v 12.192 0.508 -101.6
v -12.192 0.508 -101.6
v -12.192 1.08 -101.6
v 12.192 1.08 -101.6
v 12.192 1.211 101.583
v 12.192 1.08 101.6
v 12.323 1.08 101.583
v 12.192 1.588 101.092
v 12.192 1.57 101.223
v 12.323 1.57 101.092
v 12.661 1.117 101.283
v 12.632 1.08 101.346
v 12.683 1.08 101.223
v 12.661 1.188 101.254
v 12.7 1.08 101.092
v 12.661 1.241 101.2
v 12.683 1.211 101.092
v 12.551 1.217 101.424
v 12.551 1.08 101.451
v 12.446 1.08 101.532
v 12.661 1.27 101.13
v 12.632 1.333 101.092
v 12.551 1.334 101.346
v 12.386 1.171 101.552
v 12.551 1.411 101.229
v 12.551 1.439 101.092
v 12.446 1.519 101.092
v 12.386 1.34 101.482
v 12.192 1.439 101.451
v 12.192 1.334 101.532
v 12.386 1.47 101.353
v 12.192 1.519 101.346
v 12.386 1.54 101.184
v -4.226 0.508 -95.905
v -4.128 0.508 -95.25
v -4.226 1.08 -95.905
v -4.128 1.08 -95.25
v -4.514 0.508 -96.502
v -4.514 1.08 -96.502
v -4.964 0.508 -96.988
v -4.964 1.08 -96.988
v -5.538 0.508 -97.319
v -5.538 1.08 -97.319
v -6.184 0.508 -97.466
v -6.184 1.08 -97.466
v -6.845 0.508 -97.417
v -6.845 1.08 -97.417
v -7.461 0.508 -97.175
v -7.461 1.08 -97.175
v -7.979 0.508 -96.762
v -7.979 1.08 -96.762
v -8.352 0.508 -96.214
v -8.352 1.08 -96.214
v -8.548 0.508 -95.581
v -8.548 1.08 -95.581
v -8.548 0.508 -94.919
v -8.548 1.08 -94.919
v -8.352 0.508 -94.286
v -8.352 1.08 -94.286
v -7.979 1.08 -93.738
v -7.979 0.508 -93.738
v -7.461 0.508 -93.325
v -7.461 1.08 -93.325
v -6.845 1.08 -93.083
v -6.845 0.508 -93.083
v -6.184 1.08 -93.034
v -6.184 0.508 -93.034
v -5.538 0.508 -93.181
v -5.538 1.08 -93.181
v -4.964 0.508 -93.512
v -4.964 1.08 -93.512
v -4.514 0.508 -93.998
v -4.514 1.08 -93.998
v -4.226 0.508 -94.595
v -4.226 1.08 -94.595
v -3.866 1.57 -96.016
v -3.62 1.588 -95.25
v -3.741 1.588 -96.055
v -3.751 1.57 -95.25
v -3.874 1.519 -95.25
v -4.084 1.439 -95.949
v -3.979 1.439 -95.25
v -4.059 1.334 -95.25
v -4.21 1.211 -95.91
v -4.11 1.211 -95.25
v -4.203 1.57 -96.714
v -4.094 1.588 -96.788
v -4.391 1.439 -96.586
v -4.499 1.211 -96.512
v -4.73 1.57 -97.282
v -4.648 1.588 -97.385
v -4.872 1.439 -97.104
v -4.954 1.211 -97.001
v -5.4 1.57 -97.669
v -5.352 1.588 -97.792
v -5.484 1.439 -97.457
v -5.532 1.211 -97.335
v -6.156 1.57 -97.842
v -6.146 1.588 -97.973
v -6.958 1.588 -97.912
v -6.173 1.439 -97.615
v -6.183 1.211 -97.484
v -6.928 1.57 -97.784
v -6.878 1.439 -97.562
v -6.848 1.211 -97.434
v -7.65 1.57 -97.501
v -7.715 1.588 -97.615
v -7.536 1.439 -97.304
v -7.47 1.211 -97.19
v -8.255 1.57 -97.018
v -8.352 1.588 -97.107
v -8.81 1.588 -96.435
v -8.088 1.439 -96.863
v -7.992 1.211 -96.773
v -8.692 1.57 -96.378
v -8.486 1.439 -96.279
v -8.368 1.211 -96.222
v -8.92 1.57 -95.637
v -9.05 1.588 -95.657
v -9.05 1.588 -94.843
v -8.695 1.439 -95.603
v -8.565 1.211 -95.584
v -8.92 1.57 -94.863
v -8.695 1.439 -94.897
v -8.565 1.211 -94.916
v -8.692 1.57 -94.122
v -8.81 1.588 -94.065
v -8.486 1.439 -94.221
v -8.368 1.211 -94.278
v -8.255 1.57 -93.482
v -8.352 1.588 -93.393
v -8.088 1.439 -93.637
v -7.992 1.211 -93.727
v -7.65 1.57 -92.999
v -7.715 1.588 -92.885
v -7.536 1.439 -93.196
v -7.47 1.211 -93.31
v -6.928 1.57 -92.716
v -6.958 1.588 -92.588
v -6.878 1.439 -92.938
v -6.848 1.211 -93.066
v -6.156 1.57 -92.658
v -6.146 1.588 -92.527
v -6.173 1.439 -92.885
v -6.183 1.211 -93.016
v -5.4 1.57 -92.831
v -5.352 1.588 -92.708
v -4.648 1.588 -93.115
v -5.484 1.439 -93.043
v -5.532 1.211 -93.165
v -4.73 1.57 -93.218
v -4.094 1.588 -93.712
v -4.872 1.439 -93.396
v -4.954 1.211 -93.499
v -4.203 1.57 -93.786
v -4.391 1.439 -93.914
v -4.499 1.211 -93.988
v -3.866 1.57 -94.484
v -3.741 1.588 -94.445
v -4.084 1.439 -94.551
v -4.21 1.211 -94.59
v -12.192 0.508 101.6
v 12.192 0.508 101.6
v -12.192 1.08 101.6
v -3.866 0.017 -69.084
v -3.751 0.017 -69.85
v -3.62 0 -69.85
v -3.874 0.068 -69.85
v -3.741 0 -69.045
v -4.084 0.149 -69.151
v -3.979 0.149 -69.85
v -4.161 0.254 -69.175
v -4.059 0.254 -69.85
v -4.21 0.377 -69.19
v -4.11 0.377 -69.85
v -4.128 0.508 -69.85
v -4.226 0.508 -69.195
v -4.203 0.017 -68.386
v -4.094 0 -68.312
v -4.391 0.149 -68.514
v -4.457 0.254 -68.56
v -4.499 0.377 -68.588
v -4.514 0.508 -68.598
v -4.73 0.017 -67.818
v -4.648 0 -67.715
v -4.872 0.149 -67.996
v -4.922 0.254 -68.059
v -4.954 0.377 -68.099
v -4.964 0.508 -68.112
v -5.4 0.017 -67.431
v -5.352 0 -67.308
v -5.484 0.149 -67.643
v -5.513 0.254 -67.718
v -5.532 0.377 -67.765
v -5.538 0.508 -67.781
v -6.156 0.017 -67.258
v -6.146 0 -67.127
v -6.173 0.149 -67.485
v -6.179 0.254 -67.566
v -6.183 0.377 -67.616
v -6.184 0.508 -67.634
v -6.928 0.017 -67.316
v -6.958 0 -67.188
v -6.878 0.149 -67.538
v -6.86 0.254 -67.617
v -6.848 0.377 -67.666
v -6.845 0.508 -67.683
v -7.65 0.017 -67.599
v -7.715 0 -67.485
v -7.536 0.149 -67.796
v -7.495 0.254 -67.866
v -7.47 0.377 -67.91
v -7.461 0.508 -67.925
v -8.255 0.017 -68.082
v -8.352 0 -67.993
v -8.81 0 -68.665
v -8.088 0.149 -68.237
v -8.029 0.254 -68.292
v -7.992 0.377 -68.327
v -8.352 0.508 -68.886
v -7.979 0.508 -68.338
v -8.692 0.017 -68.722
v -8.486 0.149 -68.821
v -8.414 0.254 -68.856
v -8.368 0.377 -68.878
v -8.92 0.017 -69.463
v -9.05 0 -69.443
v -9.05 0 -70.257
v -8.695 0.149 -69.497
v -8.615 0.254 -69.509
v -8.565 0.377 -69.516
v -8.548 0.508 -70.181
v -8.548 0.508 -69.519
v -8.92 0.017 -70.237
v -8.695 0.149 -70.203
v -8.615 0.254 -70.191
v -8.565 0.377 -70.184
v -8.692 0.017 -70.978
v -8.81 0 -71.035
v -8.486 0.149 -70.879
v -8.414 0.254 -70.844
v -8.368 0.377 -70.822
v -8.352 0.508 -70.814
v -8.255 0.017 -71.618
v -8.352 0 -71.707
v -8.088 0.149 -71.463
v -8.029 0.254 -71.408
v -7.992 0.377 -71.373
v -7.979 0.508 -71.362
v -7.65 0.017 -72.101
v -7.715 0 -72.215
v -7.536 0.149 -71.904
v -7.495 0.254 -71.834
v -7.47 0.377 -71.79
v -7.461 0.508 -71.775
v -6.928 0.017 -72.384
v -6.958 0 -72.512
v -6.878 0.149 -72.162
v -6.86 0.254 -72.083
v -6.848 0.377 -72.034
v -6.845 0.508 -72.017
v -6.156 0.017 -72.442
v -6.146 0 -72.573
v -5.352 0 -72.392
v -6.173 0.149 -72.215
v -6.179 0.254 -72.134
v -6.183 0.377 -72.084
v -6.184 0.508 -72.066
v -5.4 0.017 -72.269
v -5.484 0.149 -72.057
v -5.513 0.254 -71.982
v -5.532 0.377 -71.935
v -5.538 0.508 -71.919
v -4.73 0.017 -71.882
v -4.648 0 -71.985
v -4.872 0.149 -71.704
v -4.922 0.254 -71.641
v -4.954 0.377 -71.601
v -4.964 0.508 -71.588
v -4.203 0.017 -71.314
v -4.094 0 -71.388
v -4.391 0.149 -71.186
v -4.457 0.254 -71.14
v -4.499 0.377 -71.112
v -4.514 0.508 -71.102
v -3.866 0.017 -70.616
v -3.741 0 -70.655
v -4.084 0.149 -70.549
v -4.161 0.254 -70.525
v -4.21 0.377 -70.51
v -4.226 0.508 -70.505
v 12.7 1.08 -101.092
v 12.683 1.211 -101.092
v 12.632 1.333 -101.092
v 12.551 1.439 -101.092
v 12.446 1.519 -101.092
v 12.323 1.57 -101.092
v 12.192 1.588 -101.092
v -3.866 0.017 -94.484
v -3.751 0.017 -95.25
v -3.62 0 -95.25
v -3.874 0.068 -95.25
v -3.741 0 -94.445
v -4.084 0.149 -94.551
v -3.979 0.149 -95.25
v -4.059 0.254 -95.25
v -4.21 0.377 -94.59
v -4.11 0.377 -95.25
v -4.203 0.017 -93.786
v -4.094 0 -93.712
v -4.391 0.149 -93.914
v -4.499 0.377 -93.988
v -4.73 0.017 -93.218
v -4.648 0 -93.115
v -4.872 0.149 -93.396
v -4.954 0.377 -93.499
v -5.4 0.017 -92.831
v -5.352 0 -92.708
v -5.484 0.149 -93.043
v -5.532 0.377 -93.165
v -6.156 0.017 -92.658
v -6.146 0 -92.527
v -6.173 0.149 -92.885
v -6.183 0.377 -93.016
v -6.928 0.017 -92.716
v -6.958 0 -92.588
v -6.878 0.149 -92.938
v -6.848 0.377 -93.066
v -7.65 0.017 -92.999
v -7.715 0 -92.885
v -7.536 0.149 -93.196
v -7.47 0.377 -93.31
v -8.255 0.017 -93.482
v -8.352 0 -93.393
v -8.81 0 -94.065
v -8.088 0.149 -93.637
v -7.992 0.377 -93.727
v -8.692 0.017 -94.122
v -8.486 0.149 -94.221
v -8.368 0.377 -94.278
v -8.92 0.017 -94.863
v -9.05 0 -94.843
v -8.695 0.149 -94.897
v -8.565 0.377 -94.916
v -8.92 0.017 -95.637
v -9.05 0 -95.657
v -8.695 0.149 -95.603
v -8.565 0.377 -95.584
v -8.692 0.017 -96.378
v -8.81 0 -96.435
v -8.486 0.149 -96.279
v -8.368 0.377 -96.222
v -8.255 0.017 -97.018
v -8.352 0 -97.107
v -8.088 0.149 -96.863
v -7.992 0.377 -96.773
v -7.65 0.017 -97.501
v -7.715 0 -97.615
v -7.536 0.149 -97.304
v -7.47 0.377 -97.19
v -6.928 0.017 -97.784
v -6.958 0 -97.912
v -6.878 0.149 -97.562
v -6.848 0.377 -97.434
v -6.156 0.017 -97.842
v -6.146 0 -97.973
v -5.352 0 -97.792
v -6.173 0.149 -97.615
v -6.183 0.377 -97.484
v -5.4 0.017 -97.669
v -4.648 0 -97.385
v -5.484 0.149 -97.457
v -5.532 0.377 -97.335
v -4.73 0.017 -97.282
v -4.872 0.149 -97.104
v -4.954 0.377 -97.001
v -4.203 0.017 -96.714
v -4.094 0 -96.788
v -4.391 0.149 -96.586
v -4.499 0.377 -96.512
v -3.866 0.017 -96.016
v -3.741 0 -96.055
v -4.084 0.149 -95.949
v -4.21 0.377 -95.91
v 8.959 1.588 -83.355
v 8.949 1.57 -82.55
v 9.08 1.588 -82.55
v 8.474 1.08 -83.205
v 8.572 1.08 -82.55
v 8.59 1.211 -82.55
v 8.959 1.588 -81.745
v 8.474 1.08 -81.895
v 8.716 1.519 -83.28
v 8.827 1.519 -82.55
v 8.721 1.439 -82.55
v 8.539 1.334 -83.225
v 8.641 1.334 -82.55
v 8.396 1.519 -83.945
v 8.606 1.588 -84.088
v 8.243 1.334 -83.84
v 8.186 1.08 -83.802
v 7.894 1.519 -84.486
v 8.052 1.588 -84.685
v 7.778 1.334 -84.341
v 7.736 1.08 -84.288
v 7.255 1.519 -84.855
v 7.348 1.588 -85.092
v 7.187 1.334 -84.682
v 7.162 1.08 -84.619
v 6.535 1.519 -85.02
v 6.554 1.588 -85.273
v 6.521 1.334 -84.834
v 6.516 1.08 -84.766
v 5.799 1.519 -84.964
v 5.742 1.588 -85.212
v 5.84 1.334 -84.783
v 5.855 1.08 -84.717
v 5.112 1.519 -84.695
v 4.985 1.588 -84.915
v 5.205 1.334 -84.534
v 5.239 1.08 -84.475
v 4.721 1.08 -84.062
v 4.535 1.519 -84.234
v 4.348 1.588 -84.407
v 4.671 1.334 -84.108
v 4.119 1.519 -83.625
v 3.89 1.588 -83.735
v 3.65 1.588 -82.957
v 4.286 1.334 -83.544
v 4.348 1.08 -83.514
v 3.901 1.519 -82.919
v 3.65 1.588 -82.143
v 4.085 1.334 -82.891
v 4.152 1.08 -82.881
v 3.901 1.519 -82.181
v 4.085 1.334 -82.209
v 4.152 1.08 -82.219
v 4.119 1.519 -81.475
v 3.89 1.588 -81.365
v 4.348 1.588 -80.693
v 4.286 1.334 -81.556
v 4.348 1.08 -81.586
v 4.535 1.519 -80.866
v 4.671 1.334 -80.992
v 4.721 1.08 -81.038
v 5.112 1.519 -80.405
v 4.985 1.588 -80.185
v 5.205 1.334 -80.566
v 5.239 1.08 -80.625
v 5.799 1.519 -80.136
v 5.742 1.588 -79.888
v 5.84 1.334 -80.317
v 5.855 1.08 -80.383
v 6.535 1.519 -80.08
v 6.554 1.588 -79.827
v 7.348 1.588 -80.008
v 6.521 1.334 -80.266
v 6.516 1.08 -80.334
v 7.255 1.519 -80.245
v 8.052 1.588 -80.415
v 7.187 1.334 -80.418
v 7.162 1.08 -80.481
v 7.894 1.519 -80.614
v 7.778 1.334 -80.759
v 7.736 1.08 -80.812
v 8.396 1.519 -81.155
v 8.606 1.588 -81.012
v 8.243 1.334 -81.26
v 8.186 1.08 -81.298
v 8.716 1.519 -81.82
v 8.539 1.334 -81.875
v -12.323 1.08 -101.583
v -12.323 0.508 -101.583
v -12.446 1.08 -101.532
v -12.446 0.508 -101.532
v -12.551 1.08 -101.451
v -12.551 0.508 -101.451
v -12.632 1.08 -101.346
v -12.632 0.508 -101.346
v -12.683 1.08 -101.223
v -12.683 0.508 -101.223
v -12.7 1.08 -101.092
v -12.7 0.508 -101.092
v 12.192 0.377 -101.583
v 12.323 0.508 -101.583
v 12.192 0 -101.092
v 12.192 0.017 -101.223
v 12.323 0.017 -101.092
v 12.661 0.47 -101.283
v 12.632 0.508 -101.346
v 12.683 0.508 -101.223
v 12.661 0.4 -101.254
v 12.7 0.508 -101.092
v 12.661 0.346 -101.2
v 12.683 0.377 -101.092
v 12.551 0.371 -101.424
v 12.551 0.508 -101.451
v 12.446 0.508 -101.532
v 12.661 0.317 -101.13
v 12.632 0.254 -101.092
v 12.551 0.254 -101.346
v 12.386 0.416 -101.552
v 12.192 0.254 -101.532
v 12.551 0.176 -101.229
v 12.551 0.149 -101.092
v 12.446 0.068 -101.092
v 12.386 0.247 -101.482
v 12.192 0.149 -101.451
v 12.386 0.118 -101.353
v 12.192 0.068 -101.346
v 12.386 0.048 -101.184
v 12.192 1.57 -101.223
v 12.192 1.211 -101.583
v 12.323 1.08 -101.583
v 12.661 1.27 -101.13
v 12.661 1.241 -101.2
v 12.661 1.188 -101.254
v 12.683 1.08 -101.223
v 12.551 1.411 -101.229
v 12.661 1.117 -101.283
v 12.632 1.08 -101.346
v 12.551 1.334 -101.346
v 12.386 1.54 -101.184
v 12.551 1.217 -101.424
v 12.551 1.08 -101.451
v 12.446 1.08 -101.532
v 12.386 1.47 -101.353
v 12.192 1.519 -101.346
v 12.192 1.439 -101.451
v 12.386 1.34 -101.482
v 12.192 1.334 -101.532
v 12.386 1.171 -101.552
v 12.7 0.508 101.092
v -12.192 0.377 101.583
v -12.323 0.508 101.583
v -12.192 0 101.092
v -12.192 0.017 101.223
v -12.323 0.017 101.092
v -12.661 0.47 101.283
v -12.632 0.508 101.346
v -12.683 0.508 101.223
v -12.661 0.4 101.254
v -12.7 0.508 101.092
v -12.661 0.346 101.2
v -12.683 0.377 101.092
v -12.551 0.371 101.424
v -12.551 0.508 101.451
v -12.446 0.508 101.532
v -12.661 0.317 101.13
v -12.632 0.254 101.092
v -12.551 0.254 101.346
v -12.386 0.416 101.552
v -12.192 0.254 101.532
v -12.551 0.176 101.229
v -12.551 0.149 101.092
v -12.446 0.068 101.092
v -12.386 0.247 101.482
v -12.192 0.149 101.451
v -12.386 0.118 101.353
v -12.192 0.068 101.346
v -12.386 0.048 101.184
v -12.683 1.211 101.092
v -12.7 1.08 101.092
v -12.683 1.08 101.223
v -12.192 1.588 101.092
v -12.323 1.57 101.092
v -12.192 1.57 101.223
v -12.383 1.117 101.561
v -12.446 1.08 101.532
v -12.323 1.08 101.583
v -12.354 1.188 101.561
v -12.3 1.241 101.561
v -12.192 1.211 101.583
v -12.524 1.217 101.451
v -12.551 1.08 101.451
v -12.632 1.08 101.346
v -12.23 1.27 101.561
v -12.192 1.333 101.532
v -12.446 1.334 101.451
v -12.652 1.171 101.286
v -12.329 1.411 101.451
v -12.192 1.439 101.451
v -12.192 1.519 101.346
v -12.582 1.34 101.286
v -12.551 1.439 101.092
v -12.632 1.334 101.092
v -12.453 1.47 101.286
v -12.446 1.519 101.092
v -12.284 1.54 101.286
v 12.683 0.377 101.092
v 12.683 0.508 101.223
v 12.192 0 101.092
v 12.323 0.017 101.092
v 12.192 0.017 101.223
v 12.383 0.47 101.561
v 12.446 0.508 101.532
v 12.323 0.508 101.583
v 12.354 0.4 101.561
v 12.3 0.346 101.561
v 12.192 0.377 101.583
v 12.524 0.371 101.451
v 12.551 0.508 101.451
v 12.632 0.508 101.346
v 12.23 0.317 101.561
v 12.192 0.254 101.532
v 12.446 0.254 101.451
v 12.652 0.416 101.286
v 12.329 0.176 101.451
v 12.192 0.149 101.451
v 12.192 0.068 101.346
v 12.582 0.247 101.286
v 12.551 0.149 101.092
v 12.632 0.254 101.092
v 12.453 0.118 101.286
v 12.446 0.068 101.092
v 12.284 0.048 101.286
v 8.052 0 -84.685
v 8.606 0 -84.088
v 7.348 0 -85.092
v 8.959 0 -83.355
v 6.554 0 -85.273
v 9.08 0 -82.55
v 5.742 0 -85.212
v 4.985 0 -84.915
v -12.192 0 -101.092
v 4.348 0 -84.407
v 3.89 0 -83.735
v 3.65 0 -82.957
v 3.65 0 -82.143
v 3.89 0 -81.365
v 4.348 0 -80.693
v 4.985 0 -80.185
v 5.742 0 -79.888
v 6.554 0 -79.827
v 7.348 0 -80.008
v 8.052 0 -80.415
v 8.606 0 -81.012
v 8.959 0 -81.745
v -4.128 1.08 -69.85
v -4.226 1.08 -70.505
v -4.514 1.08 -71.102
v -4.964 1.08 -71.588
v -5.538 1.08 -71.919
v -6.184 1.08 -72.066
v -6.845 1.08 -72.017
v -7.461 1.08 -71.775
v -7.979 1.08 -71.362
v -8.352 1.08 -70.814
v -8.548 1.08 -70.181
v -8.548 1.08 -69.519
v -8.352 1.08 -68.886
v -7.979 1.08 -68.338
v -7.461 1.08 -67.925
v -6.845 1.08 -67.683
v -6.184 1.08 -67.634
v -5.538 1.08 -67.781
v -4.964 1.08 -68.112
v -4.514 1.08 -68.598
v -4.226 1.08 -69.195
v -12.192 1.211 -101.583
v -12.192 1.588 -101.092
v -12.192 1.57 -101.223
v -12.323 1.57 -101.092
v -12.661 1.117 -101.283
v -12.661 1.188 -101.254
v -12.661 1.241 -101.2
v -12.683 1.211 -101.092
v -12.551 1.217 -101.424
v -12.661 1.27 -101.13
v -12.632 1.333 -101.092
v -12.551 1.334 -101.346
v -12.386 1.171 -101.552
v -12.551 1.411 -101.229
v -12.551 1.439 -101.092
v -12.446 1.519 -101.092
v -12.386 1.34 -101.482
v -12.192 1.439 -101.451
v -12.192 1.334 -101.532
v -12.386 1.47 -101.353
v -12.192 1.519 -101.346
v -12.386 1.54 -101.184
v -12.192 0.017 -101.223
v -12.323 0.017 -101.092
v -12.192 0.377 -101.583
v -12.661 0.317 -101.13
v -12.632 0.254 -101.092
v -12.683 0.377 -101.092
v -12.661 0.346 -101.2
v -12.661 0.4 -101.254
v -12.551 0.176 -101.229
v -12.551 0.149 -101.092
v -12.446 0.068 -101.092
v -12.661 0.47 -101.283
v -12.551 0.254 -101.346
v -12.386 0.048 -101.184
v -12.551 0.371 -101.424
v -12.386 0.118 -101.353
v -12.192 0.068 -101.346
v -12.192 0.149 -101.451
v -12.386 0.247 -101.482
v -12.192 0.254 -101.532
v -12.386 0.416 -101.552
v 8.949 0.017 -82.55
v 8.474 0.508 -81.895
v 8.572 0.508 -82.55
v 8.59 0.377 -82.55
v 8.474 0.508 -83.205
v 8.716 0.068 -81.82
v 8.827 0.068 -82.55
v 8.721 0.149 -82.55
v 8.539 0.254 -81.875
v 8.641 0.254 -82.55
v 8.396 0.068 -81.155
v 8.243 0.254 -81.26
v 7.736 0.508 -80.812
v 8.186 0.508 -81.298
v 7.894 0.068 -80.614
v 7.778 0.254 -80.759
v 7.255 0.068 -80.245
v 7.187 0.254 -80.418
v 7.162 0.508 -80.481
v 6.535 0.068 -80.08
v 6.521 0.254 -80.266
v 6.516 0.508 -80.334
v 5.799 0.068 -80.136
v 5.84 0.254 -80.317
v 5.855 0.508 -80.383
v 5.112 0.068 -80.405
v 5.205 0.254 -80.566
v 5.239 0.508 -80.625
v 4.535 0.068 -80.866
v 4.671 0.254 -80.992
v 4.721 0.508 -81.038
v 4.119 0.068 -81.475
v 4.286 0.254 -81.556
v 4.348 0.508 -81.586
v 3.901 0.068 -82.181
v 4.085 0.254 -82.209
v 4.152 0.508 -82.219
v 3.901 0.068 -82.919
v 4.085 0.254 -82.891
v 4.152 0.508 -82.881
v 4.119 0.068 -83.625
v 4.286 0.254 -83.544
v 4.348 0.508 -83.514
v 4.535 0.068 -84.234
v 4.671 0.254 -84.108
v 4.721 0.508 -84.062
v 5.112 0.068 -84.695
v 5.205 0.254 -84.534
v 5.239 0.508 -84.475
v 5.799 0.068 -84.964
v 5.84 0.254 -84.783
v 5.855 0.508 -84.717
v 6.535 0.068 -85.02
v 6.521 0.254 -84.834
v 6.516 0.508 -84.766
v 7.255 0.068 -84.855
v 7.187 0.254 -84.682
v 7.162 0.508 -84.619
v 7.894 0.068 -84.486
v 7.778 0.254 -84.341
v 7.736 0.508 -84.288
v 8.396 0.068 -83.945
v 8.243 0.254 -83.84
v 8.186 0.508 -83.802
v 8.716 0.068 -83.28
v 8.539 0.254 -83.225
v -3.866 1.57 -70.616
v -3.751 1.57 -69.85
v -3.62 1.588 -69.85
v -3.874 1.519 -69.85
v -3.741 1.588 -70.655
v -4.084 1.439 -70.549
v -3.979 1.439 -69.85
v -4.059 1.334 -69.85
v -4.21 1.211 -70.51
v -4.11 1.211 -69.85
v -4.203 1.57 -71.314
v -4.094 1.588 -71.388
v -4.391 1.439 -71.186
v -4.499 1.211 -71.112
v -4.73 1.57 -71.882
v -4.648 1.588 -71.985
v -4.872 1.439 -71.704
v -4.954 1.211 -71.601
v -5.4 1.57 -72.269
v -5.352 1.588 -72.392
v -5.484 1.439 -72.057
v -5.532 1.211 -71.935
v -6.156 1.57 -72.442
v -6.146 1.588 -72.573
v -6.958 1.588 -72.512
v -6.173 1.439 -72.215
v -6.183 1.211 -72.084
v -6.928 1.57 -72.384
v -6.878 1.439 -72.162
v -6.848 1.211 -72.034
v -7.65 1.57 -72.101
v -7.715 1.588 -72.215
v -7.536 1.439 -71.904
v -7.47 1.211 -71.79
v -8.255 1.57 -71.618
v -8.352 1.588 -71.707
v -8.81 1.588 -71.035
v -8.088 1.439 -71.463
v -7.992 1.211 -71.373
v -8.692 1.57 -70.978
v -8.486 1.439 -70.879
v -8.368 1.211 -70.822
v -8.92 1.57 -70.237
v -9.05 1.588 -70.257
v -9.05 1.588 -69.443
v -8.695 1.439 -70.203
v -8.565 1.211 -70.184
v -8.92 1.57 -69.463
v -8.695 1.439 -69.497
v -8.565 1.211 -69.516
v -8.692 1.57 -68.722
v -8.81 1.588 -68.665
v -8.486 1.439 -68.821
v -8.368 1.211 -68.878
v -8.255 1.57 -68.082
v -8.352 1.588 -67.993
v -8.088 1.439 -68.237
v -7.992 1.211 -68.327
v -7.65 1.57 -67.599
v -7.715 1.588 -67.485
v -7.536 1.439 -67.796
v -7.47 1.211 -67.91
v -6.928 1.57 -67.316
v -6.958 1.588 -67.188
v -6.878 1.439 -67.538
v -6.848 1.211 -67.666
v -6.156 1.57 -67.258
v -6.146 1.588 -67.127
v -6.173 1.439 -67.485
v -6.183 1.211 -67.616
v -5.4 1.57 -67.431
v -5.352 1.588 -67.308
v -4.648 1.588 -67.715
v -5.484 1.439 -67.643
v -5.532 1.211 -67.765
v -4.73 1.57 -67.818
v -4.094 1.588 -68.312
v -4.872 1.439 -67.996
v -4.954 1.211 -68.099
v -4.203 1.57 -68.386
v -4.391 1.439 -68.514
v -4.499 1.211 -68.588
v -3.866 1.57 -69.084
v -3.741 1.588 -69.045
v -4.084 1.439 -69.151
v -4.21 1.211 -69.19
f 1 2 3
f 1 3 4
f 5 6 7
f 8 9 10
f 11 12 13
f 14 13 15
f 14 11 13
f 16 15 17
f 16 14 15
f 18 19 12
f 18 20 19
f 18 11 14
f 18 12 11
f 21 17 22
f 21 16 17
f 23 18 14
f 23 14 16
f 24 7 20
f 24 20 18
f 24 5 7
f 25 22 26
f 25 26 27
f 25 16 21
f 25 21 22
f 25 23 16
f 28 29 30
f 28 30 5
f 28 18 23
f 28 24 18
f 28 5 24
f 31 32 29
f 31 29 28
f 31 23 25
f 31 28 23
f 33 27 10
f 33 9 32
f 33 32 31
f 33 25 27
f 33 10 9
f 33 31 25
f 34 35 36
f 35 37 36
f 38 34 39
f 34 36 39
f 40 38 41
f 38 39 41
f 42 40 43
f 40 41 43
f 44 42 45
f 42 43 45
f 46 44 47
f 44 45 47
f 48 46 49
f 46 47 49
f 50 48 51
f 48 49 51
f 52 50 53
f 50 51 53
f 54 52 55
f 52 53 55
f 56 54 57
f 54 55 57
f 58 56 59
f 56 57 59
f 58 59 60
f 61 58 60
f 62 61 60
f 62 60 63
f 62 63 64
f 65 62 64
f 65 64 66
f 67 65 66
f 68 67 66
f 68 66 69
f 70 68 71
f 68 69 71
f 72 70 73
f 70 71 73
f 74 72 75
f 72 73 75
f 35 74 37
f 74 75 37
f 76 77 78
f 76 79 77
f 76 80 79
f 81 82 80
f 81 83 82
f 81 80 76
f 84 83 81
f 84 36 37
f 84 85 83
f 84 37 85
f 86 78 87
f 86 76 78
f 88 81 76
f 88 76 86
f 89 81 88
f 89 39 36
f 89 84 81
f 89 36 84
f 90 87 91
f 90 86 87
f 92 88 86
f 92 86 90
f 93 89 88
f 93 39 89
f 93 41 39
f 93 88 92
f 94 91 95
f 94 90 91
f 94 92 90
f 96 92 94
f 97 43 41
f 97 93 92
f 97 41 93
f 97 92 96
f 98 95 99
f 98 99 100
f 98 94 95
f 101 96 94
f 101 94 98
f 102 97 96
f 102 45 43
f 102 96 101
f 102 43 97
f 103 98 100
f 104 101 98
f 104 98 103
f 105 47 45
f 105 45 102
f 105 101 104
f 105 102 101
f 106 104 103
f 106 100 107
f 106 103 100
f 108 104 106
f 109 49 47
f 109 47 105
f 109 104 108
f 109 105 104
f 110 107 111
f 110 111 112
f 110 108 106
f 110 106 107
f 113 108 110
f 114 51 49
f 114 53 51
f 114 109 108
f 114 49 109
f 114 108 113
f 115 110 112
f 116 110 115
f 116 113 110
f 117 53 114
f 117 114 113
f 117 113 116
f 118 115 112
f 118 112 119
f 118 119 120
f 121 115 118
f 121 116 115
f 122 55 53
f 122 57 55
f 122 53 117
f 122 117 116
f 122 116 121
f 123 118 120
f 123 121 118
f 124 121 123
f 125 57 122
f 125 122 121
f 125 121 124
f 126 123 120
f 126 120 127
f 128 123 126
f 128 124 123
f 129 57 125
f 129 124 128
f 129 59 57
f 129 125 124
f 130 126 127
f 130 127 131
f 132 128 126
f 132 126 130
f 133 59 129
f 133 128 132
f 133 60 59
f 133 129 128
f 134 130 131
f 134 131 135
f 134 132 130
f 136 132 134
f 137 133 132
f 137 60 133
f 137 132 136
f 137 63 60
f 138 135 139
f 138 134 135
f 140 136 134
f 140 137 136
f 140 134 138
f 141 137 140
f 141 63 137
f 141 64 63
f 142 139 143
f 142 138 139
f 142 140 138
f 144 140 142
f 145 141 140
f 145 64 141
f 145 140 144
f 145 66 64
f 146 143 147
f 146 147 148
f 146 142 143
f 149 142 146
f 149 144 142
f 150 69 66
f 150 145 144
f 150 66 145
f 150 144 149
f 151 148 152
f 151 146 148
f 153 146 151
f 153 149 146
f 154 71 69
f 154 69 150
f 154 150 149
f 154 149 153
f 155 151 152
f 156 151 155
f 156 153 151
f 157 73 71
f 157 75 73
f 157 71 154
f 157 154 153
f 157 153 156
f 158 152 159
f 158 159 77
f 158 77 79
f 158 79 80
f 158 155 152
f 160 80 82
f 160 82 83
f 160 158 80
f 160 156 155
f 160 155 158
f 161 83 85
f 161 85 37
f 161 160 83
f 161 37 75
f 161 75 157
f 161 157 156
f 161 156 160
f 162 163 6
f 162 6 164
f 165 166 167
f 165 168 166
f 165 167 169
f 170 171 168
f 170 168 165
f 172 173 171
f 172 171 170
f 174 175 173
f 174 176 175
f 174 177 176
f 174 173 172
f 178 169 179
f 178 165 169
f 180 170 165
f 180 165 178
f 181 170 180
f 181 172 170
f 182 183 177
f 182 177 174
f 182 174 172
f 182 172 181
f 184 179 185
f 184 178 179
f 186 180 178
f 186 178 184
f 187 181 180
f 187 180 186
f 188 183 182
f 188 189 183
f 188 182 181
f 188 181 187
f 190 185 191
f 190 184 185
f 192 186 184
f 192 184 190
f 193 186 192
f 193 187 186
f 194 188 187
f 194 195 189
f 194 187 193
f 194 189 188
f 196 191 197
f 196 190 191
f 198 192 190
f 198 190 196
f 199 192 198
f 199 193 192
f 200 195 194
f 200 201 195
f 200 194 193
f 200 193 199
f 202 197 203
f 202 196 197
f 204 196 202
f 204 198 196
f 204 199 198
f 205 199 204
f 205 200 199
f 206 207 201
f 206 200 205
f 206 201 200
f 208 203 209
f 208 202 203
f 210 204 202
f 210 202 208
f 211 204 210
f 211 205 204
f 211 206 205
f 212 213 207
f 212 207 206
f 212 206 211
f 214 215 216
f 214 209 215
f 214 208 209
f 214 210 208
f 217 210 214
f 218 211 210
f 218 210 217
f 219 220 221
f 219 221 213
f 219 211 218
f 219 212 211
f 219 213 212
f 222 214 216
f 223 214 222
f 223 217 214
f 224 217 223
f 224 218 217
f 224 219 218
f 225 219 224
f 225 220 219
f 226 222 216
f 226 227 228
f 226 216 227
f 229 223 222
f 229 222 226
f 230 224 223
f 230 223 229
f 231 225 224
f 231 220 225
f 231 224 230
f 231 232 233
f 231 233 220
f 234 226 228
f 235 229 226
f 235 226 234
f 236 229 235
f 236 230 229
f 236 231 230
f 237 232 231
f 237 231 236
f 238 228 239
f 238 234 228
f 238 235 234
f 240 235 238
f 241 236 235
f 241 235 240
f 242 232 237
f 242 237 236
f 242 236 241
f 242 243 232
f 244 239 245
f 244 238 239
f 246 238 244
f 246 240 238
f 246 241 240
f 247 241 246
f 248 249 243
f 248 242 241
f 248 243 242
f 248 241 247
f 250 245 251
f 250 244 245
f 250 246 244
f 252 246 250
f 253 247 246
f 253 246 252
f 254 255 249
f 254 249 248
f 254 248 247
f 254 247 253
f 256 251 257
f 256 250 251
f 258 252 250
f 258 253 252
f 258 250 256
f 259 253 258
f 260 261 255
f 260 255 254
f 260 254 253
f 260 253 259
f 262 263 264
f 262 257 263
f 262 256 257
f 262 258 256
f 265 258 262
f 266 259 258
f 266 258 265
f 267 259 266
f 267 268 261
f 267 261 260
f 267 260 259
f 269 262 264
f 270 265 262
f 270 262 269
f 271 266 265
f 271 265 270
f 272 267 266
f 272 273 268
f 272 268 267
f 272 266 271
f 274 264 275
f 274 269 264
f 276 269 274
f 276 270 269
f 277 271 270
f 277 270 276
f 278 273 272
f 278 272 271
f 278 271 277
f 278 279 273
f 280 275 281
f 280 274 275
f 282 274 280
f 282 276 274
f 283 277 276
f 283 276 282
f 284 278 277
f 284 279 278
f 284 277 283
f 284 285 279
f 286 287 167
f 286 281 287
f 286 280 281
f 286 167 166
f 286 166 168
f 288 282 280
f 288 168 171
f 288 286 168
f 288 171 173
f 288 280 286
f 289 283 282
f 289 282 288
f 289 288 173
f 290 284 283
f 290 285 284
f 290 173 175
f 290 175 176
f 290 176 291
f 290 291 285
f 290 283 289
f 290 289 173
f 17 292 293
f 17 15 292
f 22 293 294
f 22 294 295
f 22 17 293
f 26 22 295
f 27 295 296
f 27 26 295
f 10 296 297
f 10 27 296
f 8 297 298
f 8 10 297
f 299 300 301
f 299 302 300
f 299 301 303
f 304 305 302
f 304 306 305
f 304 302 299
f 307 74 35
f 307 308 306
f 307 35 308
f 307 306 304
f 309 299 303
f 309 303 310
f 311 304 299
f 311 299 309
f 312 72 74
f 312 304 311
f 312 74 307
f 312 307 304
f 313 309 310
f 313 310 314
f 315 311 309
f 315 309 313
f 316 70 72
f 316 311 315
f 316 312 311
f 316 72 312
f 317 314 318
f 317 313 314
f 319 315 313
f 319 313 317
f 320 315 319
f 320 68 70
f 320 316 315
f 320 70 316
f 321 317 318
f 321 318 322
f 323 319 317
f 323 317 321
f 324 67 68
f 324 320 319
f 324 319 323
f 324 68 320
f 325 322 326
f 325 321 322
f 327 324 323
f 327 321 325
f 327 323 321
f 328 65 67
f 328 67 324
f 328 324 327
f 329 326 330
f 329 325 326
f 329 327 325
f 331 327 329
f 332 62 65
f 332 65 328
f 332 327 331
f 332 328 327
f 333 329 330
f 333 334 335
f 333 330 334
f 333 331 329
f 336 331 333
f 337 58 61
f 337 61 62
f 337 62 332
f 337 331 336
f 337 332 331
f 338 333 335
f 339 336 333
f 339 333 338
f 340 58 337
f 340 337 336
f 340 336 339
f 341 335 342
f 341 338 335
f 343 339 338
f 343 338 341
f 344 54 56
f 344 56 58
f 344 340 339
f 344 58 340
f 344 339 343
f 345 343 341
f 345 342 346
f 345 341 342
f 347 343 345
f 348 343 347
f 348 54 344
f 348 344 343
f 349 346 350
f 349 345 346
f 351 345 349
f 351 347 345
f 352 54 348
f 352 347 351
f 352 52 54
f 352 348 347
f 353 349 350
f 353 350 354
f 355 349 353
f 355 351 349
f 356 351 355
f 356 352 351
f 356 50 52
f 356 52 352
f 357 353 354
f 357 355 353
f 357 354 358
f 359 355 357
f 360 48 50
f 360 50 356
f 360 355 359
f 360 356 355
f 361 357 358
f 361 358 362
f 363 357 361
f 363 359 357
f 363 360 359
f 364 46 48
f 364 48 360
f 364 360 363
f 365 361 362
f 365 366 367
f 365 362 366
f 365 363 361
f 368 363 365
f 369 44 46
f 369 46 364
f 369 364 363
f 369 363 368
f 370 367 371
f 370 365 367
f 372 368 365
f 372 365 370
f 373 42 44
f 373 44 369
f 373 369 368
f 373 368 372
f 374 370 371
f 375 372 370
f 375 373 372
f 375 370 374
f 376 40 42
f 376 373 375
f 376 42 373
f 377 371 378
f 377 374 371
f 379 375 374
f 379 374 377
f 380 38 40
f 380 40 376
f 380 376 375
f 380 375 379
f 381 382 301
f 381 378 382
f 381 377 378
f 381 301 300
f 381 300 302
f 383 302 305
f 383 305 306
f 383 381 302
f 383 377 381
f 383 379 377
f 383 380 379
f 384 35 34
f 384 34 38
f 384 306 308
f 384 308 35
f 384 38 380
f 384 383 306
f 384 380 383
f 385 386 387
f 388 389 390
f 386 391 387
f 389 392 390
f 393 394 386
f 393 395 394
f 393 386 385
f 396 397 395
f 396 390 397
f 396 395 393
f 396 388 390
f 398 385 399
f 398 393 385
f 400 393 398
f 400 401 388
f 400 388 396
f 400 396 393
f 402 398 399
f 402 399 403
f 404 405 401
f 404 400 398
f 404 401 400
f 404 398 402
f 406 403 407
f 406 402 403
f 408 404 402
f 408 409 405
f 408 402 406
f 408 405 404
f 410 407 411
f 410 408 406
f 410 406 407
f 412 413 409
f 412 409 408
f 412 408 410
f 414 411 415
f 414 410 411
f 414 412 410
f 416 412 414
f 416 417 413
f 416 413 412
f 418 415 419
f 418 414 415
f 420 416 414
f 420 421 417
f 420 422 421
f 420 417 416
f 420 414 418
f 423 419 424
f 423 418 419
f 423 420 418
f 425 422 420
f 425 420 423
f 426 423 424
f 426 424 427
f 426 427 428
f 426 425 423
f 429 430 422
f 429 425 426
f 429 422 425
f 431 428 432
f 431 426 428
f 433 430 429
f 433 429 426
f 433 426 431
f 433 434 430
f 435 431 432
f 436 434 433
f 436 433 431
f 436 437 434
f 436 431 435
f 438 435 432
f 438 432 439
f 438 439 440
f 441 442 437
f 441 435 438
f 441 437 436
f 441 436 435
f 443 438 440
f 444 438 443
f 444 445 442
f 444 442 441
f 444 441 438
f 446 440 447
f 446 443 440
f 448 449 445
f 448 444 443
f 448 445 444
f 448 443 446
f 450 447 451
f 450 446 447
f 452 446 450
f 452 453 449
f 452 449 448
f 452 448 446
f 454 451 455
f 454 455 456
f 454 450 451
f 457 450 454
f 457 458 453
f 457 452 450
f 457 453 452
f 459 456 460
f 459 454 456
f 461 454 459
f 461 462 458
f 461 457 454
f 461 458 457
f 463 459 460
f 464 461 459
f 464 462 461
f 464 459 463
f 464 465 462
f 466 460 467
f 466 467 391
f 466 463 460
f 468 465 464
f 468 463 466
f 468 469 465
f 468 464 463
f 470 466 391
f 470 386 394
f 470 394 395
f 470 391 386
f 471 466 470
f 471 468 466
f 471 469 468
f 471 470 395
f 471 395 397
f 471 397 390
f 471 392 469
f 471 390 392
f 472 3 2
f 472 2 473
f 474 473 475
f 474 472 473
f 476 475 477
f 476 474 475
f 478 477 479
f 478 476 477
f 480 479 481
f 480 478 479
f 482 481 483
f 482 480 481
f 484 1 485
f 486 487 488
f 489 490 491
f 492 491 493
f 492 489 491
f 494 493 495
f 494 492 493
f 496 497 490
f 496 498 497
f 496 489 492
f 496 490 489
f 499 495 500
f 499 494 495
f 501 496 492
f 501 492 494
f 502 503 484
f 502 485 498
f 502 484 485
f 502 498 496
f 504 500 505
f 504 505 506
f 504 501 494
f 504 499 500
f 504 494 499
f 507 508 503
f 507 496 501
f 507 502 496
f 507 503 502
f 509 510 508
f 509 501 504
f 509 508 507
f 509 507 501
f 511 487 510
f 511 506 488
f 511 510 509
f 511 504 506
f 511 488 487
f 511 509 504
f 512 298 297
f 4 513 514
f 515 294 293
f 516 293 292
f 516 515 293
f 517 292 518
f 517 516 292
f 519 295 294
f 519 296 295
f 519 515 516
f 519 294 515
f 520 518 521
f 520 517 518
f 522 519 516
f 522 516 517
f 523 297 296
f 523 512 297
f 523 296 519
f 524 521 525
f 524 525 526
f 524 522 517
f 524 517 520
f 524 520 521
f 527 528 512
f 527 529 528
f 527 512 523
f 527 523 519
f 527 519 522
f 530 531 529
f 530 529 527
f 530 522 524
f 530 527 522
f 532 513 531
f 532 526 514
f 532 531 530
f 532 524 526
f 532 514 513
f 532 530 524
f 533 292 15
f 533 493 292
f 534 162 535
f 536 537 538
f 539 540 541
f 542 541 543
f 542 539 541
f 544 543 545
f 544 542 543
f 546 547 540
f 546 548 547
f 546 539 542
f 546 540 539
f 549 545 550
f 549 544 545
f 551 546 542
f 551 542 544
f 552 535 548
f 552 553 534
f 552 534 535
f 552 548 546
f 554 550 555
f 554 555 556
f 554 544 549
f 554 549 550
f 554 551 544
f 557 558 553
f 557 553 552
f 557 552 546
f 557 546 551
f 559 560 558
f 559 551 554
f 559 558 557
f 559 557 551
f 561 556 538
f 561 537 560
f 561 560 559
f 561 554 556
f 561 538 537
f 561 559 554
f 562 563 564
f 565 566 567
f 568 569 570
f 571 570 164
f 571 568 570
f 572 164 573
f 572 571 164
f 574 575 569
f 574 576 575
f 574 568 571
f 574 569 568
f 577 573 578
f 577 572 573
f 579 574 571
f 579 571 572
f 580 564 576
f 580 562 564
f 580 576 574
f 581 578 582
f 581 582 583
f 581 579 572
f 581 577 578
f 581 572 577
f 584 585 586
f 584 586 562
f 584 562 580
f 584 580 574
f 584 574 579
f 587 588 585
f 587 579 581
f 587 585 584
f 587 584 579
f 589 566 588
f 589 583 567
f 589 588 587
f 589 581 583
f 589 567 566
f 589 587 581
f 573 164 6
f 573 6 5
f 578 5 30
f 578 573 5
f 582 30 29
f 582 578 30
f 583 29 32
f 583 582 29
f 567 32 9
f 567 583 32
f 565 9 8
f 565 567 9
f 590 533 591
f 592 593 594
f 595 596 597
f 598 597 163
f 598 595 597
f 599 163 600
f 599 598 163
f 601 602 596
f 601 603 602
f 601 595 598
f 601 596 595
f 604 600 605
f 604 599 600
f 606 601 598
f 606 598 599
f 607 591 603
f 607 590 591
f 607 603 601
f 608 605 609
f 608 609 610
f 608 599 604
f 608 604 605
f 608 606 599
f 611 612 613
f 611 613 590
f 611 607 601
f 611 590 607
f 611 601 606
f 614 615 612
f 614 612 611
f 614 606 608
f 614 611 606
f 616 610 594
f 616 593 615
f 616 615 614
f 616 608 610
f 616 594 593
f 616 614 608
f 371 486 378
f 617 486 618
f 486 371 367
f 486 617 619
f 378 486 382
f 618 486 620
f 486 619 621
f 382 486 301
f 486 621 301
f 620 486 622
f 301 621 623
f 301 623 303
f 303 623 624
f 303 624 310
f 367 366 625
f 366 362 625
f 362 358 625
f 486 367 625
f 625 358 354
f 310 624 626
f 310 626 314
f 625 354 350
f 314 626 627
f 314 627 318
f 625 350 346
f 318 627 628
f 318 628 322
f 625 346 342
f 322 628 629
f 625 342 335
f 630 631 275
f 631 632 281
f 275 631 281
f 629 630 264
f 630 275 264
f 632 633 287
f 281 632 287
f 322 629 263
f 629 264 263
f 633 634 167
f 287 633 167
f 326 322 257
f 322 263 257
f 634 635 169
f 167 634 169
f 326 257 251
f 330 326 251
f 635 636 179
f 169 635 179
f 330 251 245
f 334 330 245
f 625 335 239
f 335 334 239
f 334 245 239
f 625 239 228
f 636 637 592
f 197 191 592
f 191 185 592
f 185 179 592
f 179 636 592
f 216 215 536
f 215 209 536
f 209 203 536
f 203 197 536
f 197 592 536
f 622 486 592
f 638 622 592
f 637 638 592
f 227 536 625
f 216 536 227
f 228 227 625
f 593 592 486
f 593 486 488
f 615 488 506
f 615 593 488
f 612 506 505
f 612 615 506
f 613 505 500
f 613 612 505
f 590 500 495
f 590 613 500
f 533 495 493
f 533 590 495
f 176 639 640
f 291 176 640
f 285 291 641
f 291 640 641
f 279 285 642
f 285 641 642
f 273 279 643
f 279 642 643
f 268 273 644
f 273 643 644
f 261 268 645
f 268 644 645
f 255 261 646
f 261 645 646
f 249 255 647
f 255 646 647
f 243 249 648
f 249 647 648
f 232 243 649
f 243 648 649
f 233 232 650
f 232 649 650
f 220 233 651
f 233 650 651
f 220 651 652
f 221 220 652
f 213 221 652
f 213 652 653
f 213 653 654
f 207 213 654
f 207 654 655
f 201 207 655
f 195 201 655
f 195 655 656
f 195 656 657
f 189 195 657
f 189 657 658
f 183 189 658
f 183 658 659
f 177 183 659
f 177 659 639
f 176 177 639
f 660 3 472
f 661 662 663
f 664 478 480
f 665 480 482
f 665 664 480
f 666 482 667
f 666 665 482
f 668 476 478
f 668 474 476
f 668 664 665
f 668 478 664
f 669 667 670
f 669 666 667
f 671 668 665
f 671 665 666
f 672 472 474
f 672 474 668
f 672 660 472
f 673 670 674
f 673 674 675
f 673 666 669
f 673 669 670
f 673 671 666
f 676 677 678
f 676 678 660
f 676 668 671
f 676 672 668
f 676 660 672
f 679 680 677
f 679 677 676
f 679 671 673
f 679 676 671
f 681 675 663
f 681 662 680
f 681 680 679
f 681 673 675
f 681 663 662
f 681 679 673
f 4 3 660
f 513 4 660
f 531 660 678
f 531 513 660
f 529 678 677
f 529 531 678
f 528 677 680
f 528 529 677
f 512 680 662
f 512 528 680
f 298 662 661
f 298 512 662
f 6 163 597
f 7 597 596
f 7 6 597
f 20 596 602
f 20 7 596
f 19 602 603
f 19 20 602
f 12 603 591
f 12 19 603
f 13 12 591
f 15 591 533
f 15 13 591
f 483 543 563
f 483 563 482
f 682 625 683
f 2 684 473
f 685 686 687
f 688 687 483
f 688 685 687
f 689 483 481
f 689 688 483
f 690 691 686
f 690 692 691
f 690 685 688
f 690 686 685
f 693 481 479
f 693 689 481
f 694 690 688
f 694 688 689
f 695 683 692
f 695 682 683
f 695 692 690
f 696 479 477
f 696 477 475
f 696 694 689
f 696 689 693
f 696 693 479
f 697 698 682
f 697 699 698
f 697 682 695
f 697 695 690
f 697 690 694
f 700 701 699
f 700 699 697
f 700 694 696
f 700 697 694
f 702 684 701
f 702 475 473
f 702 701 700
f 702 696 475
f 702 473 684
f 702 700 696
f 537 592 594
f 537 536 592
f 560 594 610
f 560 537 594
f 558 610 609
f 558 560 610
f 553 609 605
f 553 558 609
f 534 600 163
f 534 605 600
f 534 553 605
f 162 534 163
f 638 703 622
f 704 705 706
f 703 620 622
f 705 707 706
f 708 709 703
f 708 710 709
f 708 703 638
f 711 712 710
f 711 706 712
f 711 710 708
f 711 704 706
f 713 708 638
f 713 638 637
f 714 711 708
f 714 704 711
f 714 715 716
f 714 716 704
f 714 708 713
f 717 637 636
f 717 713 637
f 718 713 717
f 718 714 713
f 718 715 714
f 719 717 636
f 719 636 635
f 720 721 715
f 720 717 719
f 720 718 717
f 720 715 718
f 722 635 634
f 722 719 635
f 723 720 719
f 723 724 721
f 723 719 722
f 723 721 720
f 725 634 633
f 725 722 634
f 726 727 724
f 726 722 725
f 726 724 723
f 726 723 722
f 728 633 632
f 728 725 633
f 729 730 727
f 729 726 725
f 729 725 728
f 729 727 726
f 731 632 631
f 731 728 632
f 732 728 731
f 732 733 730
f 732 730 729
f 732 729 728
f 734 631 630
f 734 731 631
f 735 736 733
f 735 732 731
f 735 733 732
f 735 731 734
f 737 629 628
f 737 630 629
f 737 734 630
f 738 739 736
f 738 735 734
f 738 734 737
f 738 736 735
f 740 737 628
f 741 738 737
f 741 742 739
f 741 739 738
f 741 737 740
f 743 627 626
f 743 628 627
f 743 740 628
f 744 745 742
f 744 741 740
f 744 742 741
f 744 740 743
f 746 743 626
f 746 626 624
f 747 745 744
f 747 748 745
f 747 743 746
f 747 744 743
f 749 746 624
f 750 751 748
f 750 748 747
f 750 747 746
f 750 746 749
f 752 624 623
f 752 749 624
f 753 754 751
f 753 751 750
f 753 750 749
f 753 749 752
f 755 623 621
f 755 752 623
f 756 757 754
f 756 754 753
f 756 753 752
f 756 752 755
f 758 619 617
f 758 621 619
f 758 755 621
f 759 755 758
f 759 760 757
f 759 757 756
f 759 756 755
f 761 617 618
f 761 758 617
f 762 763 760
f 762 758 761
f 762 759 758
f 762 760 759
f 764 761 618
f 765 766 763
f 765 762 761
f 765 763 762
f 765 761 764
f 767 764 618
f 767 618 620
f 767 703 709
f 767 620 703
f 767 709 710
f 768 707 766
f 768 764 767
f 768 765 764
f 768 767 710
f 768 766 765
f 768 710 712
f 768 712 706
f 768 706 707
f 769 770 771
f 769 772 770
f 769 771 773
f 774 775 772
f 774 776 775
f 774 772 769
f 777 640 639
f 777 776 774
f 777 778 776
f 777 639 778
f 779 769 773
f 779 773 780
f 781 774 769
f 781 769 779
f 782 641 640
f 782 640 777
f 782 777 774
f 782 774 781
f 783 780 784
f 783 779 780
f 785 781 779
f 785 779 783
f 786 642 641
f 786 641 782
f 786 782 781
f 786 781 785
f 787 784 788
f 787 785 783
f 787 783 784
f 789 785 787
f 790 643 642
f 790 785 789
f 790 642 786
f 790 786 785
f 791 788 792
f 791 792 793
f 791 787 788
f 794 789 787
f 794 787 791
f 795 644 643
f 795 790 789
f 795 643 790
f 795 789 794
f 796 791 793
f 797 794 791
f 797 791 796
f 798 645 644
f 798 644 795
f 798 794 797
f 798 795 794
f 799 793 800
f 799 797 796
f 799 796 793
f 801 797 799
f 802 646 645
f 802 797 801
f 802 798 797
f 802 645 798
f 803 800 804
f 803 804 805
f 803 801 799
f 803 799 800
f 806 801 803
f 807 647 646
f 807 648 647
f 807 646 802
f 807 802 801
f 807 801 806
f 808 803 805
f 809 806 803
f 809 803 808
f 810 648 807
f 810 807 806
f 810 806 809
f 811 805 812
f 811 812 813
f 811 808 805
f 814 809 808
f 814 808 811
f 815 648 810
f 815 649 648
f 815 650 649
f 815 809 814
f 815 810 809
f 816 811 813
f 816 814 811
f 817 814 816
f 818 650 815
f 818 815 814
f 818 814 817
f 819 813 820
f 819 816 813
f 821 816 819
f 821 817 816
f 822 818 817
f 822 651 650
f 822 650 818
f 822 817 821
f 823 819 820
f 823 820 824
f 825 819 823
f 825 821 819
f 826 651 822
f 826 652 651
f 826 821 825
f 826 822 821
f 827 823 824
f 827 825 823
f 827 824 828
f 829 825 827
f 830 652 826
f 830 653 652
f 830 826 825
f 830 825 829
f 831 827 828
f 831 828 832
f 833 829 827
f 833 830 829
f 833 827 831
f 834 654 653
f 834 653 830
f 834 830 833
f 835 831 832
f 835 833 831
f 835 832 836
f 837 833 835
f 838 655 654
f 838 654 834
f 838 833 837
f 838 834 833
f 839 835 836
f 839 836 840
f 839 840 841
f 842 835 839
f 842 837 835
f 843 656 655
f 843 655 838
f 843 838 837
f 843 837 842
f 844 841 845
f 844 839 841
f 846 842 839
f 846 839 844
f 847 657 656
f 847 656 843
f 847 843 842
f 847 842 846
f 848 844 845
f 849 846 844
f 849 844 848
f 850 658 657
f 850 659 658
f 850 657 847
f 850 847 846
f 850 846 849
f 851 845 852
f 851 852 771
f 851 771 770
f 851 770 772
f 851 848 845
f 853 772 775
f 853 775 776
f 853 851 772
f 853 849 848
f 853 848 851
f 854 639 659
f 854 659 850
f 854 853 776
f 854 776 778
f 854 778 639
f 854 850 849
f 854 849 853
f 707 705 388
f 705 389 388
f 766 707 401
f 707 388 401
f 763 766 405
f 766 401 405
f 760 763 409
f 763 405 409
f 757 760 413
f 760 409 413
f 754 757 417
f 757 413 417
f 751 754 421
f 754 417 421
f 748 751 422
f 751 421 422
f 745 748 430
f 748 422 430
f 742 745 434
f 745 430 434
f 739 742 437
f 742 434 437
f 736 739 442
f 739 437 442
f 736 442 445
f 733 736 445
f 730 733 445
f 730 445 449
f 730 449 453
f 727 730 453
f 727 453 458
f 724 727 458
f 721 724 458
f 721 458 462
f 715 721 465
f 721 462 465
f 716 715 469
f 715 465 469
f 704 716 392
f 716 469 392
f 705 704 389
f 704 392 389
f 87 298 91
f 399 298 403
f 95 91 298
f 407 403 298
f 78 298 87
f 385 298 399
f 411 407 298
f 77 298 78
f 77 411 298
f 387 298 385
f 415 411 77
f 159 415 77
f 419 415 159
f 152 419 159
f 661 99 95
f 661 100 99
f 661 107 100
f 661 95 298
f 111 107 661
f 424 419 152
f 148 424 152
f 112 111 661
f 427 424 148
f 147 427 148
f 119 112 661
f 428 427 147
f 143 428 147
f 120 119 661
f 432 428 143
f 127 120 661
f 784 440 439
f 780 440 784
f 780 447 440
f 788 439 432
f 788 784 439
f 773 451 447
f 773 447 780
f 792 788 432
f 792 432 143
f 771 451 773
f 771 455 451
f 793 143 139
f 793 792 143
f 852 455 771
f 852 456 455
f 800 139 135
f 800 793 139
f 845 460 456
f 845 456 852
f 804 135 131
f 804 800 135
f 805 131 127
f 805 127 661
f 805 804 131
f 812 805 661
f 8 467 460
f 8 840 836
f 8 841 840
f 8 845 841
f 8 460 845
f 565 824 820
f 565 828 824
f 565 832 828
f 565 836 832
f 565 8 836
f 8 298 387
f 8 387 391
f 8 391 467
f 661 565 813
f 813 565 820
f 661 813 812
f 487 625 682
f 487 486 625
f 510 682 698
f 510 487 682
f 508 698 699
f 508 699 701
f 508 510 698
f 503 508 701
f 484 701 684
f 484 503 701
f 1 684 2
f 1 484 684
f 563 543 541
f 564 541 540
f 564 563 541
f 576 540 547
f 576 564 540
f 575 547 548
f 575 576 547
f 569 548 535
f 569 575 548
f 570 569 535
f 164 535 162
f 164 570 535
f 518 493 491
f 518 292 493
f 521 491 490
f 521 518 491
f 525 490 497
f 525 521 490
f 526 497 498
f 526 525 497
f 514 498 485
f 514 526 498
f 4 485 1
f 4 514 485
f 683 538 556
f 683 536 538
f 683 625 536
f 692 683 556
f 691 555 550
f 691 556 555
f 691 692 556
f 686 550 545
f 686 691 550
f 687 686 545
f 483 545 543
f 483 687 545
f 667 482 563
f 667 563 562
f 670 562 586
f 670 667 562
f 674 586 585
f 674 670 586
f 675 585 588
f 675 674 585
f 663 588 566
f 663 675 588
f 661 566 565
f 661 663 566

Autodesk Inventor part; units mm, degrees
ref_plane "YZ Plane" through (0, 0, 0) normal (1, 0, 0) x (0, 1, 0)
ref_plane "XZ Plane" through (0, 0, 0) normal (0, 1, 0) x (-1, 0, 0)
ref_plane "XY Plane" through (0, 0, 0) normal (0, 0, 1) x (1, 0, 0)
sketch "Sketch1" plane through (0, 0, 0) normal (0, 1, 0) x (-1, 0, 0)
  line L0 (12.7, -101.6) -> (-12.7, -101.6)
  line L1 (-12.7, -101.6) -> (-12.7, 101.6)
  line L2 (-12.7, 101.6) -> (12.7, 101.6)
  line L3 (12.7, 101.6) -> (12.7, -101.6)
  line L4 (12.7, -101.6) -> (-12.7, 101.6) construction
  line L5 (-12.7, -101.6) -> (12.7, 101.6) construction
  point P0 (0, 0)
  dimension "d0" = 25.4
  dimension "d1" = 203.2
extrude "Extrusion1" add sketch "Sketch1" along normal blind 1.5875
sketch "Sketch2" plane through (0, 1.5875, 0) normal (0, 1, 0) x (1, 0, 0)
  line L0 (12.7, 101.6) -> (-12.7, 101.6) projected
  line L1 (-12.7, 101.6) -> (-12.7, -101.6) projected
  circle A0 centre (-6.35, 95.25) radius 2.2225
  circle A1 centre (-6.35, 82.55) radius 2.2225
  circle A2 centre (-6.35, 69.85) radius 2.2225
  circle A3 centre (6.35, 95.25) radius 2.2225
  circle A4 centre (6.35, 82.55) radius 2.2225
  circle A5 centre (6.35, 69.85) radius 2.2225
  point P0 (0, 0)
  dimension "d4" = 4.445
  dimension "d5" = 6.35
  dimension "d6" = 6.35
  dimension "d9" = 12.7
  dimension "d12" = 12.7
extrude "Extrusion2" cut sketch "Sketch2" against normal blind 1.5875 contours A0 | A2 | A4
fillet "Fillet1" radius 0.508 18 edges at (0, 1.5875, -101.6) (-12.7, 1.5875, 0) (0, 1.5875, 101.6) (12.7, 1.5875, 0) (-8.5725, 1.5875, -69.85) (-8.5725, 1.5875, -95.25) (4.1275, 1.5875, -82.55) (4.1275, 0, -82.55) (-8.5725, 0, -69.85) (-8.5725, 0, -95.25) (0, 0, -101.6) (12.7, 0, 0) (0, 0, 101.6) (-12.7, 0, 0) (12.7, 0.7937, -101.6) (-12.7, 0.7937, -101.6) (12.7, 0.7937, 101.6) (-12.7, 0.7937, 101.6)
properties part number "big ball holder" material "Polycarbonate, Clear"
